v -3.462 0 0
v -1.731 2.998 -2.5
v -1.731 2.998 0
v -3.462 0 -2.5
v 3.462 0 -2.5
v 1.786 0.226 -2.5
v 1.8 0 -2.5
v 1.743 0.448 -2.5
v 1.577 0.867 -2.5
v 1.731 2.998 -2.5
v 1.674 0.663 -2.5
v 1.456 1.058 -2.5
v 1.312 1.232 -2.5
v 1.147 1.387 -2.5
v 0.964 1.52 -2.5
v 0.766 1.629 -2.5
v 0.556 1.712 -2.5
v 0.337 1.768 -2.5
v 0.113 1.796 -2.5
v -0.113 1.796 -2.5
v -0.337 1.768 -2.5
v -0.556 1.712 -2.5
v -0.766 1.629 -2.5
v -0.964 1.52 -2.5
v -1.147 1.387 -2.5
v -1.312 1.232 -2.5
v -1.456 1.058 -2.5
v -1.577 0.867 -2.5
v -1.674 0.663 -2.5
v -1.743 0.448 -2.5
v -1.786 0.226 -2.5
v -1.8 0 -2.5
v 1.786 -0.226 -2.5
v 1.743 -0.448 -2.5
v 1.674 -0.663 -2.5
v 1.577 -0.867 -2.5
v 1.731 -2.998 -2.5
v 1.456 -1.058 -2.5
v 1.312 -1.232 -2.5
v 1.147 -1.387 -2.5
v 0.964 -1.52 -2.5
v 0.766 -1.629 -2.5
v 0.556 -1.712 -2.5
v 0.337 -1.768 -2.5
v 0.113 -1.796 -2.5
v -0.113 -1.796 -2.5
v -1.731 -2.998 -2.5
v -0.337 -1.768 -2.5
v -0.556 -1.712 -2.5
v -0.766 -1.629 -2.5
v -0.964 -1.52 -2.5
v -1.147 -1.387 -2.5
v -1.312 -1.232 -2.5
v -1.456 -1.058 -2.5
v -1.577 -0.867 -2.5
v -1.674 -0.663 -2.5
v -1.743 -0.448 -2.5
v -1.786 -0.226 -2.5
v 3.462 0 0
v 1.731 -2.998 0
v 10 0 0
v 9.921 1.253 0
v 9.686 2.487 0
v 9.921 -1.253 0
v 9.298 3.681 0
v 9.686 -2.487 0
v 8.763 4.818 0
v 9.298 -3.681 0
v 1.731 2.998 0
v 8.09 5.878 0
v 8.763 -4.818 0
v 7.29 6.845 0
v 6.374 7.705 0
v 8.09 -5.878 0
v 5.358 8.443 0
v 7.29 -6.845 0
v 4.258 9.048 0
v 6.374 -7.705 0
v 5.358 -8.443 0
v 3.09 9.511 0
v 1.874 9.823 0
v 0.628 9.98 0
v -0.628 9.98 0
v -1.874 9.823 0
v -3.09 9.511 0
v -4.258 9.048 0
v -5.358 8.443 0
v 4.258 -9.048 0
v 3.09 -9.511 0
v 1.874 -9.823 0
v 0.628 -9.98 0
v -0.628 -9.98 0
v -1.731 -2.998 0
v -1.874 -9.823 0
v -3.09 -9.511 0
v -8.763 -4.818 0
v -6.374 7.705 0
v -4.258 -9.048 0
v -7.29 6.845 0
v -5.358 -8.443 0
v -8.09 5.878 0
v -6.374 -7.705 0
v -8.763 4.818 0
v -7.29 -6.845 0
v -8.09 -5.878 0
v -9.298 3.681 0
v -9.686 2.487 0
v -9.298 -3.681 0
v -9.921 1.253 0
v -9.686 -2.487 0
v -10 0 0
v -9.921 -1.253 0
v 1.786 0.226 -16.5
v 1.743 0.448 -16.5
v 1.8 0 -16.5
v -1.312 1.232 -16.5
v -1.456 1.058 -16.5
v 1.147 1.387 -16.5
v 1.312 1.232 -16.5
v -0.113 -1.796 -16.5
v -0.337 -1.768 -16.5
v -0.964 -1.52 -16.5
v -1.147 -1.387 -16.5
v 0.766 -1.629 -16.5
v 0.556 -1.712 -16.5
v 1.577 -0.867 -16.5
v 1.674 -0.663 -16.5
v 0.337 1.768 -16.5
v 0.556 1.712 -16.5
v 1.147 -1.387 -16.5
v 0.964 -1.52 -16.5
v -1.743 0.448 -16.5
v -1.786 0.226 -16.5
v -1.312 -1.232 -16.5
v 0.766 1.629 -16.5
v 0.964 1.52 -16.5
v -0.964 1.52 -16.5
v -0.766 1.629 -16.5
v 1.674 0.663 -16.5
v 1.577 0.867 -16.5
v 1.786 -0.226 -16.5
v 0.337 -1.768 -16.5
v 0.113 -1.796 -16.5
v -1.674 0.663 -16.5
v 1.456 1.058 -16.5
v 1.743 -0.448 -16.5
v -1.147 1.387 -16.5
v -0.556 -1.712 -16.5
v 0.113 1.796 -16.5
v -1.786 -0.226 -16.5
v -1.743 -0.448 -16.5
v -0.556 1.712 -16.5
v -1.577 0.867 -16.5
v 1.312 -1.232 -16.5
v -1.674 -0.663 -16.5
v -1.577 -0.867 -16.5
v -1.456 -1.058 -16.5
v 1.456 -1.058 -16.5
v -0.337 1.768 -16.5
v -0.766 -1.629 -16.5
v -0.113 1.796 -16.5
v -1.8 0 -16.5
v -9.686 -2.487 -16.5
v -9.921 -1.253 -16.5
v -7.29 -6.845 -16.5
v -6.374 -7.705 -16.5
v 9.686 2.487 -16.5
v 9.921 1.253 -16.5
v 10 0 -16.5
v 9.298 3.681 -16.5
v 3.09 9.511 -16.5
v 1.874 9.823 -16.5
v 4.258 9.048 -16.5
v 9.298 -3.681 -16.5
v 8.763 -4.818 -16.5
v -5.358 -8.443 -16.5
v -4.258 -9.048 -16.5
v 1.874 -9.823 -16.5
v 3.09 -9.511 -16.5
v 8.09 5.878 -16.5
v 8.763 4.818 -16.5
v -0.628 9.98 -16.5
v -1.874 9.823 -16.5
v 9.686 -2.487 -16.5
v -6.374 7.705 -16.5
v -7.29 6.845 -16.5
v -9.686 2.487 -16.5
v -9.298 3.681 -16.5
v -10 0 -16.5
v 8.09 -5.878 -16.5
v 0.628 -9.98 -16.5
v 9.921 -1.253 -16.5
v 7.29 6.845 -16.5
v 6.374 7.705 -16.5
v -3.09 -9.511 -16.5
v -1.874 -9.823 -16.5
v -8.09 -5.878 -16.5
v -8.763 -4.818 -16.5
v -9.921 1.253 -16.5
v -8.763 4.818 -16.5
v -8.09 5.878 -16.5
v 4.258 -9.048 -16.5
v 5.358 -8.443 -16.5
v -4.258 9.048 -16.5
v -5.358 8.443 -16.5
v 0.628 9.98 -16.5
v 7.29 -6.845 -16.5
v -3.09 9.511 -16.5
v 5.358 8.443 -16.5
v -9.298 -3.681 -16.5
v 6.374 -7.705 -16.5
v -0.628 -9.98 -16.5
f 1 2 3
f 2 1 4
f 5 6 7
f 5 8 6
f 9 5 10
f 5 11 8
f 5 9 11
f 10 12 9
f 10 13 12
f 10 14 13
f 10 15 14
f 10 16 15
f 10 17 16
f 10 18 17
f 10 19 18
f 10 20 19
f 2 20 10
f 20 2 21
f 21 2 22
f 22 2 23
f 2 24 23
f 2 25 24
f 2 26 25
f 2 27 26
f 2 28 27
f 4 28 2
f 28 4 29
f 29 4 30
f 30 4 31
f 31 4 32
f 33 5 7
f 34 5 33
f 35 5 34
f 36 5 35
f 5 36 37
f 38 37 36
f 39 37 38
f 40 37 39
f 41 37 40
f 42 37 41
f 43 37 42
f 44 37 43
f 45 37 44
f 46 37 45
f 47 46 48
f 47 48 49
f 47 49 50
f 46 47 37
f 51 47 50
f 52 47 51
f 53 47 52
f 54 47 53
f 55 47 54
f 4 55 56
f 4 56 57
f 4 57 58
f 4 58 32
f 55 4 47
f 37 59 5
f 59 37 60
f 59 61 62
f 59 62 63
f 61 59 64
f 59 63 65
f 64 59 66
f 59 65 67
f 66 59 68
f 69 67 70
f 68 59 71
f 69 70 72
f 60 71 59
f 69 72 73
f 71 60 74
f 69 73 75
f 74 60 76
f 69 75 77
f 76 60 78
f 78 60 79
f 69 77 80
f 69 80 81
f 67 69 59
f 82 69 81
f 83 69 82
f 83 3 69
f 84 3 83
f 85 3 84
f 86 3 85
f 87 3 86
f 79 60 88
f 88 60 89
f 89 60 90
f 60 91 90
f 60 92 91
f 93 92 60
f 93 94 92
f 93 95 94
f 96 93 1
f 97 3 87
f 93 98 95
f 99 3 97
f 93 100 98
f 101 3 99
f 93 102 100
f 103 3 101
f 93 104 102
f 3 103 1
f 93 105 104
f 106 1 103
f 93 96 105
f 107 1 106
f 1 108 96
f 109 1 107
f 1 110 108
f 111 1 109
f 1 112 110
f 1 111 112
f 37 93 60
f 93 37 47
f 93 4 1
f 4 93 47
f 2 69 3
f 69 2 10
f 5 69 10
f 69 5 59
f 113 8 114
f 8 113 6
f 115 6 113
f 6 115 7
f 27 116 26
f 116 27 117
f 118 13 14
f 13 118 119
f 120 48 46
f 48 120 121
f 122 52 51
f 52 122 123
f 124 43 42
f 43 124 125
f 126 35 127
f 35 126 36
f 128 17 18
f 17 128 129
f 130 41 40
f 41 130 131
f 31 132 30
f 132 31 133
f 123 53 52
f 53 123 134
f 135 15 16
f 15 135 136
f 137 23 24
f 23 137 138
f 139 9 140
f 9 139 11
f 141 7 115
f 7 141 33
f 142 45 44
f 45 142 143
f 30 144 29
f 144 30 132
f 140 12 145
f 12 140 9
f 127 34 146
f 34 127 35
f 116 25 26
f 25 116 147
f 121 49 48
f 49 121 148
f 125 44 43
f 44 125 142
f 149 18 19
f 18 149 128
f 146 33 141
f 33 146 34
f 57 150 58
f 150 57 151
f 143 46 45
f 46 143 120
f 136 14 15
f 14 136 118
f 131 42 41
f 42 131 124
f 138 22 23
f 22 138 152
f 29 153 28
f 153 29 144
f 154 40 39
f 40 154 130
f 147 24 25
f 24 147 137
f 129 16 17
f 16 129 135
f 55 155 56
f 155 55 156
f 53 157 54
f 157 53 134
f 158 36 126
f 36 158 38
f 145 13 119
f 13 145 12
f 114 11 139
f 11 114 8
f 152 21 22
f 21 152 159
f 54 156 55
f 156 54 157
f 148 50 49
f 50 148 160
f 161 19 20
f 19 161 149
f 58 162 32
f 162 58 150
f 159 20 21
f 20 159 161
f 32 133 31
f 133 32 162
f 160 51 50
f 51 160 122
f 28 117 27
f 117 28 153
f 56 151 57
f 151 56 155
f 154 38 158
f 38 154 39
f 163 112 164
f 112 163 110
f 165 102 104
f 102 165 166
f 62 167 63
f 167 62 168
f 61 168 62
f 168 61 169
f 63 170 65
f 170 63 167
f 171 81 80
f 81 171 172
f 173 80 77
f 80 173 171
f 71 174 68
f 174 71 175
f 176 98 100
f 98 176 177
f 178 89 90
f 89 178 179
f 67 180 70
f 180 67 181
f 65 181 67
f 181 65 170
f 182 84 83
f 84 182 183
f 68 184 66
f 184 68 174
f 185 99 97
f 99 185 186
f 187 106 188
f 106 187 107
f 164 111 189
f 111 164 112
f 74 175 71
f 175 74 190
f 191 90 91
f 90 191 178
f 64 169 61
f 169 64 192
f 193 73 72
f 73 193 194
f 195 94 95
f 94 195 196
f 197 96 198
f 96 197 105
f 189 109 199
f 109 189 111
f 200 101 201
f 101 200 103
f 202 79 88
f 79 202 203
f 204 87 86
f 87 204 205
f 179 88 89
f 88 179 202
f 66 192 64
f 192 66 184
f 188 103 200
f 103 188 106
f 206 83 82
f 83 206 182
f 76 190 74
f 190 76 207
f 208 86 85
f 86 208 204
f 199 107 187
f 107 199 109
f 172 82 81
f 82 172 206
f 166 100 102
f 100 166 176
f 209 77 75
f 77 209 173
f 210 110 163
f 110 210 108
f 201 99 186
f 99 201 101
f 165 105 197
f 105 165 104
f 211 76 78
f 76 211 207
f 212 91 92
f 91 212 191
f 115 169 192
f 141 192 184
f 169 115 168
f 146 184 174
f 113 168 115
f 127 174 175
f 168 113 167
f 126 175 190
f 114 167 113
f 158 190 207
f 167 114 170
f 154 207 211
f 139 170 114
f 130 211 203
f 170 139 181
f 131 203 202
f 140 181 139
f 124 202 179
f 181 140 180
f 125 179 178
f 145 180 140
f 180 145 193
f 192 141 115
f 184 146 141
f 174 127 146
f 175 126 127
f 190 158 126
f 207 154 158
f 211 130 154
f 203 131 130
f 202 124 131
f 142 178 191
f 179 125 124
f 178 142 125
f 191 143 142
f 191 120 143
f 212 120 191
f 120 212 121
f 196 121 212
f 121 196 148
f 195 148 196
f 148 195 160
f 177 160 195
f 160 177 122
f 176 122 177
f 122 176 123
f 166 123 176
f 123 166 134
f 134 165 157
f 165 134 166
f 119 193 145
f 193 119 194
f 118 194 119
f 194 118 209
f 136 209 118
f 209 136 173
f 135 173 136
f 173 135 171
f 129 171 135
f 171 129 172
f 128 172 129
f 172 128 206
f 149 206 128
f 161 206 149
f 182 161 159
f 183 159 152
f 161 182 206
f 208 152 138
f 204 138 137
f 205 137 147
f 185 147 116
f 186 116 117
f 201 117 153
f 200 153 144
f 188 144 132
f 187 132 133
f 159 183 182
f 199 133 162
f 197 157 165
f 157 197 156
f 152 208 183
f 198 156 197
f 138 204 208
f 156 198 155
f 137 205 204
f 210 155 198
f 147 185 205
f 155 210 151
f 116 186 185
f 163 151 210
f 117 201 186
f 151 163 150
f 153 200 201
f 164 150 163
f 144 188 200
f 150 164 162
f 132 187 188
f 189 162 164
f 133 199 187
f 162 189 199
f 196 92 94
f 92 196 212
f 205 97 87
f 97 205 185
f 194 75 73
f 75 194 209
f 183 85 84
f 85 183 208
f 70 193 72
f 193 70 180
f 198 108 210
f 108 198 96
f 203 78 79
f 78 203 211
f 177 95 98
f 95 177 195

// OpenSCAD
$fn = 50;

difference() {
	union() {
		translate(v = [0, 0, -16.5]) {
			cylinder(h = 16.5, r = 10.0);
		}
	}
	union() {
		translate(v = [0, 0, 0]) {
			rotate(a = [0, 0, 0]) {
				difference() {
					union() {
						translate(v = [0, 0, -2.5]) {
							linear_extrude(height = 2.5) {
								polygon(points = [[3.4619999999999997, 0.0], [1.7310000000000003, 2.9981799479017264], [-1.7309999999999992, 2.9981799479017264], [-3.4619999999999997, 4.2397272186481365e-16], [-1.7310000000000014, -2.998179947901726], [1.7309999999999977, -2.9981799479017277]]);
							}
						}
					}
					union();
				}
			}
		}
		#translate(v = [0, 0, -100.0]) {
			cylinder(h = 200, r = 1.8);
		}
	}
}
